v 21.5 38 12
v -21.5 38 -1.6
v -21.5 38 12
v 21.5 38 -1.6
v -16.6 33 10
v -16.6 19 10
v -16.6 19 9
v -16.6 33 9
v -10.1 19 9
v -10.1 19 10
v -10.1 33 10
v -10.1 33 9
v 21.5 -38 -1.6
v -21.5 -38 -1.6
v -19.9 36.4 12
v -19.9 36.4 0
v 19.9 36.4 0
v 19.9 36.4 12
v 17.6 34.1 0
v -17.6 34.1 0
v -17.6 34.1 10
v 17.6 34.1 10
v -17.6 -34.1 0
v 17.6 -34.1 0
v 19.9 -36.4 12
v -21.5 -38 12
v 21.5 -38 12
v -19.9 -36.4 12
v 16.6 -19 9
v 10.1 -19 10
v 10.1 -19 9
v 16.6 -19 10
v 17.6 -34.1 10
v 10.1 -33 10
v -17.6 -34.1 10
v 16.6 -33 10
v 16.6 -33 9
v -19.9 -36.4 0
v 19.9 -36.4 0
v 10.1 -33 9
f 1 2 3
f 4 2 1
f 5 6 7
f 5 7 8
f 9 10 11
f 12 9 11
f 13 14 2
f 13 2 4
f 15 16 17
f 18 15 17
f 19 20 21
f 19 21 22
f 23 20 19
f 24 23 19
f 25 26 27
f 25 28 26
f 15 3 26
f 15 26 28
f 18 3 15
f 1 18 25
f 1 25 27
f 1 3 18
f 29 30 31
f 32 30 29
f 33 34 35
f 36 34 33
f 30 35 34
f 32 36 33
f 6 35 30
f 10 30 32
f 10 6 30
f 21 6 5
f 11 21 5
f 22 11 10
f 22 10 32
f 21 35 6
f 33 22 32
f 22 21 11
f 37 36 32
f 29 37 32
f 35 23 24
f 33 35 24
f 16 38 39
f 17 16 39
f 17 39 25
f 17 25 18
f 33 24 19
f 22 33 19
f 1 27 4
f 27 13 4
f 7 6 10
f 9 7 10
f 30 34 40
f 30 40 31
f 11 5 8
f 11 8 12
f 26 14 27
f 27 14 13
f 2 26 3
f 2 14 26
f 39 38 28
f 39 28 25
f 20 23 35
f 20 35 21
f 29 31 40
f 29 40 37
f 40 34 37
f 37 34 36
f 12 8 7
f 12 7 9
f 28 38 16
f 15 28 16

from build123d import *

# Parameters (mm, degrees)
F0_W     = 35.2
F0_H     = 68.2
F1_DEPTH = 10
F2_W     = 6.5
F2_H     = 14
F2_W_2   = 6.4999983017
F3_DEPTH = 1
F4_W     = 43
F4_H     = 76
F5_DEPTH = 1.6
F6_W     = 43
F6_H     = 76
F6_W_2   = 39.8
F6_H_2   = 72.8
F7_DEPTH = 12


with BuildPart() as f1:
    # F0 (on Top) → F1 (new body)
    with BuildSketch(Plane.XY):
        Rectangle(F0_W, F0_H)
    extrude(amount=F1_DEPTH)

    # F2 (on face) → F3 (cut)
    with BuildSketch(Plane.XY.offset(10)):
        with Locations((-13.35, 26)):
            Rectangle(F2_W, F2_H)
        with Locations((13.3499991509, -26)):
            Rectangle(F2_W_2, F2_H)
    extrude(amount=-F3_DEPTH, mode=Mode.SUBTRACT)


with BuildPart() as f5:
    # F4 (on face) → F5 (new body)
    with BuildSketch(Plane(origin=(0, 0, 0), x_dir=(1, 0, 0), z_dir=(0, 0, -1))):
        Rectangle(F4_W, F4_H)
    extrude(amount=F5_DEPTH)

    # F6 (on face) → F7 (join)
    with BuildSketch(Plane.XY):
        Rectangle(F6_W, F6_H)
        Rectangle(F6_W_2, F6_H_2, mode=Mode.SUBTRACT)
    extrude(amount=F7_DEPTH)


solid = Compound([f1.part, f5.part])
